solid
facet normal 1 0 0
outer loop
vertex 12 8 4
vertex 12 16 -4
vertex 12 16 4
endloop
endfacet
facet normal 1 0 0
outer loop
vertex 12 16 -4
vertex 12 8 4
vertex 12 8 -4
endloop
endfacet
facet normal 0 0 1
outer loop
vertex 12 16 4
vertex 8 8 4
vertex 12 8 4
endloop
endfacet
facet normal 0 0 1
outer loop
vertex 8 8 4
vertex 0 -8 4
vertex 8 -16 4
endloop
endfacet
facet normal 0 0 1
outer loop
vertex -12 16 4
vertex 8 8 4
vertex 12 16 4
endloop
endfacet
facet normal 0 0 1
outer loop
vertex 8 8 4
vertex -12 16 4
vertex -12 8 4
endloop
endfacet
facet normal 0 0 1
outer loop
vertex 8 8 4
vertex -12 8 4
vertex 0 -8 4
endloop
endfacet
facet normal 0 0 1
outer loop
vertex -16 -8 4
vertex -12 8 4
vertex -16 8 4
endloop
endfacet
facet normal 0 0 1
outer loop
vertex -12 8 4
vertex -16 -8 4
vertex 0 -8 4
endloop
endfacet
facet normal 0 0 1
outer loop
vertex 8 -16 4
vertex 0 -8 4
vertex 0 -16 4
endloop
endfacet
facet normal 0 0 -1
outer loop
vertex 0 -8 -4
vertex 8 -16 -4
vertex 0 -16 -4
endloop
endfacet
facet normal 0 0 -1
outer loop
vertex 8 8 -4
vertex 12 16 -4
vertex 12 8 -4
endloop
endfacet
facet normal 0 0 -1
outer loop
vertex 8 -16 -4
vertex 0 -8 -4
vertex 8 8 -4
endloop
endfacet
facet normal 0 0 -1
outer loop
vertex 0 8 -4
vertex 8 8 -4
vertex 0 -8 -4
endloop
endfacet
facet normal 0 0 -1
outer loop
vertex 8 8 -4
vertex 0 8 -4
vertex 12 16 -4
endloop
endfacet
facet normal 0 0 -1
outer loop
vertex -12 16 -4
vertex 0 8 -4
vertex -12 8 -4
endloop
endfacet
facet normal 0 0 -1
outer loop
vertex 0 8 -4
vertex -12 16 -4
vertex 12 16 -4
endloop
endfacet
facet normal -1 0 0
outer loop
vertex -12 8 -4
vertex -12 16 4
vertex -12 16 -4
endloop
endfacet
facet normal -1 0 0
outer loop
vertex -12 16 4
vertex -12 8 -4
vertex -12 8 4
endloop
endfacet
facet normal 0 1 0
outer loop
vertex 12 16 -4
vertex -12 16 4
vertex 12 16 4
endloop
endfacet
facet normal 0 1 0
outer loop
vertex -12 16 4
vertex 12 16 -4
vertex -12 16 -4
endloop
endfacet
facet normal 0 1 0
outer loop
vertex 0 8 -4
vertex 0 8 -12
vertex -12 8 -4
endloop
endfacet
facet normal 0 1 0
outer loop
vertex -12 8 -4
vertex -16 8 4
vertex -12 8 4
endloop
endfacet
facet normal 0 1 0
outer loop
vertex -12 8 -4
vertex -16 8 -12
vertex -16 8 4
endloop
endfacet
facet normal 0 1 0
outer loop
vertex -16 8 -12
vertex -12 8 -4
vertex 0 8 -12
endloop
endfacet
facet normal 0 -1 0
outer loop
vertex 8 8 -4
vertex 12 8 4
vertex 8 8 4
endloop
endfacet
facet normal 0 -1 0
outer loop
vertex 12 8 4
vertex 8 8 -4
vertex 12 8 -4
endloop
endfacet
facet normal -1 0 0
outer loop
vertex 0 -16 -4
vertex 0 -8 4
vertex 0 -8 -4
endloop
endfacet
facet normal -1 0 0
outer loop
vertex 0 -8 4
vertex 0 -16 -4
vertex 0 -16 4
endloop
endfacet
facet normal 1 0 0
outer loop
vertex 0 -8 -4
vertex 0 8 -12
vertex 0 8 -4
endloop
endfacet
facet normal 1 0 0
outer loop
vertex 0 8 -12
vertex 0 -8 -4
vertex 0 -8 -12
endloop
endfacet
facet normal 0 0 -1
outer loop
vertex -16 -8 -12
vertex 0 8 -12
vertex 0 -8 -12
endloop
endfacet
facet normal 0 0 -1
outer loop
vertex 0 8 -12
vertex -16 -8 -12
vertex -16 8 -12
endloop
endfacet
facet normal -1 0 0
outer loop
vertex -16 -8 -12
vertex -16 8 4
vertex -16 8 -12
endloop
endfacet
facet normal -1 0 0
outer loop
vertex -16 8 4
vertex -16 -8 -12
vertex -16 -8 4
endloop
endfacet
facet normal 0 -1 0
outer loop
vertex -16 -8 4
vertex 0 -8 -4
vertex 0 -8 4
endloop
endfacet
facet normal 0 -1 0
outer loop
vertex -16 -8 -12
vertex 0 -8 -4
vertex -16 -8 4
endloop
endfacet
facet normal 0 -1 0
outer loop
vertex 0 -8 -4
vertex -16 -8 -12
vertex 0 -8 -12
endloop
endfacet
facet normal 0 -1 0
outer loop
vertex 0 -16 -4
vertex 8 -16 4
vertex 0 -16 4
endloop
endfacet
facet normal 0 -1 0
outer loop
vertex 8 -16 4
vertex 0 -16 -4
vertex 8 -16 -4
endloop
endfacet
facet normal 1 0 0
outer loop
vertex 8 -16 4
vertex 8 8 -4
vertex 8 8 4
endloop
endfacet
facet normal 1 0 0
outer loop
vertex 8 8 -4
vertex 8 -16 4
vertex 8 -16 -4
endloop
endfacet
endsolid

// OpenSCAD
size = 32;//block=32 //item=8

translate([0, size * 0.375, 0]) {
  cube([size * 0.75, size * 0.25, size * 0.25], center = true);
}
;
translate([-size * 0.25, 0, -size * 0.125]) {
  cube([size * 0.5, size * 0.5, size * 0.5], center = true);
}
;
translate([size * 0.125, 0, 0]) {
  rotate([0, 90, 90]) {
    cube([size * 0.25, size * 0.25, size * 1], center = true);
  }
  ;
}
;
